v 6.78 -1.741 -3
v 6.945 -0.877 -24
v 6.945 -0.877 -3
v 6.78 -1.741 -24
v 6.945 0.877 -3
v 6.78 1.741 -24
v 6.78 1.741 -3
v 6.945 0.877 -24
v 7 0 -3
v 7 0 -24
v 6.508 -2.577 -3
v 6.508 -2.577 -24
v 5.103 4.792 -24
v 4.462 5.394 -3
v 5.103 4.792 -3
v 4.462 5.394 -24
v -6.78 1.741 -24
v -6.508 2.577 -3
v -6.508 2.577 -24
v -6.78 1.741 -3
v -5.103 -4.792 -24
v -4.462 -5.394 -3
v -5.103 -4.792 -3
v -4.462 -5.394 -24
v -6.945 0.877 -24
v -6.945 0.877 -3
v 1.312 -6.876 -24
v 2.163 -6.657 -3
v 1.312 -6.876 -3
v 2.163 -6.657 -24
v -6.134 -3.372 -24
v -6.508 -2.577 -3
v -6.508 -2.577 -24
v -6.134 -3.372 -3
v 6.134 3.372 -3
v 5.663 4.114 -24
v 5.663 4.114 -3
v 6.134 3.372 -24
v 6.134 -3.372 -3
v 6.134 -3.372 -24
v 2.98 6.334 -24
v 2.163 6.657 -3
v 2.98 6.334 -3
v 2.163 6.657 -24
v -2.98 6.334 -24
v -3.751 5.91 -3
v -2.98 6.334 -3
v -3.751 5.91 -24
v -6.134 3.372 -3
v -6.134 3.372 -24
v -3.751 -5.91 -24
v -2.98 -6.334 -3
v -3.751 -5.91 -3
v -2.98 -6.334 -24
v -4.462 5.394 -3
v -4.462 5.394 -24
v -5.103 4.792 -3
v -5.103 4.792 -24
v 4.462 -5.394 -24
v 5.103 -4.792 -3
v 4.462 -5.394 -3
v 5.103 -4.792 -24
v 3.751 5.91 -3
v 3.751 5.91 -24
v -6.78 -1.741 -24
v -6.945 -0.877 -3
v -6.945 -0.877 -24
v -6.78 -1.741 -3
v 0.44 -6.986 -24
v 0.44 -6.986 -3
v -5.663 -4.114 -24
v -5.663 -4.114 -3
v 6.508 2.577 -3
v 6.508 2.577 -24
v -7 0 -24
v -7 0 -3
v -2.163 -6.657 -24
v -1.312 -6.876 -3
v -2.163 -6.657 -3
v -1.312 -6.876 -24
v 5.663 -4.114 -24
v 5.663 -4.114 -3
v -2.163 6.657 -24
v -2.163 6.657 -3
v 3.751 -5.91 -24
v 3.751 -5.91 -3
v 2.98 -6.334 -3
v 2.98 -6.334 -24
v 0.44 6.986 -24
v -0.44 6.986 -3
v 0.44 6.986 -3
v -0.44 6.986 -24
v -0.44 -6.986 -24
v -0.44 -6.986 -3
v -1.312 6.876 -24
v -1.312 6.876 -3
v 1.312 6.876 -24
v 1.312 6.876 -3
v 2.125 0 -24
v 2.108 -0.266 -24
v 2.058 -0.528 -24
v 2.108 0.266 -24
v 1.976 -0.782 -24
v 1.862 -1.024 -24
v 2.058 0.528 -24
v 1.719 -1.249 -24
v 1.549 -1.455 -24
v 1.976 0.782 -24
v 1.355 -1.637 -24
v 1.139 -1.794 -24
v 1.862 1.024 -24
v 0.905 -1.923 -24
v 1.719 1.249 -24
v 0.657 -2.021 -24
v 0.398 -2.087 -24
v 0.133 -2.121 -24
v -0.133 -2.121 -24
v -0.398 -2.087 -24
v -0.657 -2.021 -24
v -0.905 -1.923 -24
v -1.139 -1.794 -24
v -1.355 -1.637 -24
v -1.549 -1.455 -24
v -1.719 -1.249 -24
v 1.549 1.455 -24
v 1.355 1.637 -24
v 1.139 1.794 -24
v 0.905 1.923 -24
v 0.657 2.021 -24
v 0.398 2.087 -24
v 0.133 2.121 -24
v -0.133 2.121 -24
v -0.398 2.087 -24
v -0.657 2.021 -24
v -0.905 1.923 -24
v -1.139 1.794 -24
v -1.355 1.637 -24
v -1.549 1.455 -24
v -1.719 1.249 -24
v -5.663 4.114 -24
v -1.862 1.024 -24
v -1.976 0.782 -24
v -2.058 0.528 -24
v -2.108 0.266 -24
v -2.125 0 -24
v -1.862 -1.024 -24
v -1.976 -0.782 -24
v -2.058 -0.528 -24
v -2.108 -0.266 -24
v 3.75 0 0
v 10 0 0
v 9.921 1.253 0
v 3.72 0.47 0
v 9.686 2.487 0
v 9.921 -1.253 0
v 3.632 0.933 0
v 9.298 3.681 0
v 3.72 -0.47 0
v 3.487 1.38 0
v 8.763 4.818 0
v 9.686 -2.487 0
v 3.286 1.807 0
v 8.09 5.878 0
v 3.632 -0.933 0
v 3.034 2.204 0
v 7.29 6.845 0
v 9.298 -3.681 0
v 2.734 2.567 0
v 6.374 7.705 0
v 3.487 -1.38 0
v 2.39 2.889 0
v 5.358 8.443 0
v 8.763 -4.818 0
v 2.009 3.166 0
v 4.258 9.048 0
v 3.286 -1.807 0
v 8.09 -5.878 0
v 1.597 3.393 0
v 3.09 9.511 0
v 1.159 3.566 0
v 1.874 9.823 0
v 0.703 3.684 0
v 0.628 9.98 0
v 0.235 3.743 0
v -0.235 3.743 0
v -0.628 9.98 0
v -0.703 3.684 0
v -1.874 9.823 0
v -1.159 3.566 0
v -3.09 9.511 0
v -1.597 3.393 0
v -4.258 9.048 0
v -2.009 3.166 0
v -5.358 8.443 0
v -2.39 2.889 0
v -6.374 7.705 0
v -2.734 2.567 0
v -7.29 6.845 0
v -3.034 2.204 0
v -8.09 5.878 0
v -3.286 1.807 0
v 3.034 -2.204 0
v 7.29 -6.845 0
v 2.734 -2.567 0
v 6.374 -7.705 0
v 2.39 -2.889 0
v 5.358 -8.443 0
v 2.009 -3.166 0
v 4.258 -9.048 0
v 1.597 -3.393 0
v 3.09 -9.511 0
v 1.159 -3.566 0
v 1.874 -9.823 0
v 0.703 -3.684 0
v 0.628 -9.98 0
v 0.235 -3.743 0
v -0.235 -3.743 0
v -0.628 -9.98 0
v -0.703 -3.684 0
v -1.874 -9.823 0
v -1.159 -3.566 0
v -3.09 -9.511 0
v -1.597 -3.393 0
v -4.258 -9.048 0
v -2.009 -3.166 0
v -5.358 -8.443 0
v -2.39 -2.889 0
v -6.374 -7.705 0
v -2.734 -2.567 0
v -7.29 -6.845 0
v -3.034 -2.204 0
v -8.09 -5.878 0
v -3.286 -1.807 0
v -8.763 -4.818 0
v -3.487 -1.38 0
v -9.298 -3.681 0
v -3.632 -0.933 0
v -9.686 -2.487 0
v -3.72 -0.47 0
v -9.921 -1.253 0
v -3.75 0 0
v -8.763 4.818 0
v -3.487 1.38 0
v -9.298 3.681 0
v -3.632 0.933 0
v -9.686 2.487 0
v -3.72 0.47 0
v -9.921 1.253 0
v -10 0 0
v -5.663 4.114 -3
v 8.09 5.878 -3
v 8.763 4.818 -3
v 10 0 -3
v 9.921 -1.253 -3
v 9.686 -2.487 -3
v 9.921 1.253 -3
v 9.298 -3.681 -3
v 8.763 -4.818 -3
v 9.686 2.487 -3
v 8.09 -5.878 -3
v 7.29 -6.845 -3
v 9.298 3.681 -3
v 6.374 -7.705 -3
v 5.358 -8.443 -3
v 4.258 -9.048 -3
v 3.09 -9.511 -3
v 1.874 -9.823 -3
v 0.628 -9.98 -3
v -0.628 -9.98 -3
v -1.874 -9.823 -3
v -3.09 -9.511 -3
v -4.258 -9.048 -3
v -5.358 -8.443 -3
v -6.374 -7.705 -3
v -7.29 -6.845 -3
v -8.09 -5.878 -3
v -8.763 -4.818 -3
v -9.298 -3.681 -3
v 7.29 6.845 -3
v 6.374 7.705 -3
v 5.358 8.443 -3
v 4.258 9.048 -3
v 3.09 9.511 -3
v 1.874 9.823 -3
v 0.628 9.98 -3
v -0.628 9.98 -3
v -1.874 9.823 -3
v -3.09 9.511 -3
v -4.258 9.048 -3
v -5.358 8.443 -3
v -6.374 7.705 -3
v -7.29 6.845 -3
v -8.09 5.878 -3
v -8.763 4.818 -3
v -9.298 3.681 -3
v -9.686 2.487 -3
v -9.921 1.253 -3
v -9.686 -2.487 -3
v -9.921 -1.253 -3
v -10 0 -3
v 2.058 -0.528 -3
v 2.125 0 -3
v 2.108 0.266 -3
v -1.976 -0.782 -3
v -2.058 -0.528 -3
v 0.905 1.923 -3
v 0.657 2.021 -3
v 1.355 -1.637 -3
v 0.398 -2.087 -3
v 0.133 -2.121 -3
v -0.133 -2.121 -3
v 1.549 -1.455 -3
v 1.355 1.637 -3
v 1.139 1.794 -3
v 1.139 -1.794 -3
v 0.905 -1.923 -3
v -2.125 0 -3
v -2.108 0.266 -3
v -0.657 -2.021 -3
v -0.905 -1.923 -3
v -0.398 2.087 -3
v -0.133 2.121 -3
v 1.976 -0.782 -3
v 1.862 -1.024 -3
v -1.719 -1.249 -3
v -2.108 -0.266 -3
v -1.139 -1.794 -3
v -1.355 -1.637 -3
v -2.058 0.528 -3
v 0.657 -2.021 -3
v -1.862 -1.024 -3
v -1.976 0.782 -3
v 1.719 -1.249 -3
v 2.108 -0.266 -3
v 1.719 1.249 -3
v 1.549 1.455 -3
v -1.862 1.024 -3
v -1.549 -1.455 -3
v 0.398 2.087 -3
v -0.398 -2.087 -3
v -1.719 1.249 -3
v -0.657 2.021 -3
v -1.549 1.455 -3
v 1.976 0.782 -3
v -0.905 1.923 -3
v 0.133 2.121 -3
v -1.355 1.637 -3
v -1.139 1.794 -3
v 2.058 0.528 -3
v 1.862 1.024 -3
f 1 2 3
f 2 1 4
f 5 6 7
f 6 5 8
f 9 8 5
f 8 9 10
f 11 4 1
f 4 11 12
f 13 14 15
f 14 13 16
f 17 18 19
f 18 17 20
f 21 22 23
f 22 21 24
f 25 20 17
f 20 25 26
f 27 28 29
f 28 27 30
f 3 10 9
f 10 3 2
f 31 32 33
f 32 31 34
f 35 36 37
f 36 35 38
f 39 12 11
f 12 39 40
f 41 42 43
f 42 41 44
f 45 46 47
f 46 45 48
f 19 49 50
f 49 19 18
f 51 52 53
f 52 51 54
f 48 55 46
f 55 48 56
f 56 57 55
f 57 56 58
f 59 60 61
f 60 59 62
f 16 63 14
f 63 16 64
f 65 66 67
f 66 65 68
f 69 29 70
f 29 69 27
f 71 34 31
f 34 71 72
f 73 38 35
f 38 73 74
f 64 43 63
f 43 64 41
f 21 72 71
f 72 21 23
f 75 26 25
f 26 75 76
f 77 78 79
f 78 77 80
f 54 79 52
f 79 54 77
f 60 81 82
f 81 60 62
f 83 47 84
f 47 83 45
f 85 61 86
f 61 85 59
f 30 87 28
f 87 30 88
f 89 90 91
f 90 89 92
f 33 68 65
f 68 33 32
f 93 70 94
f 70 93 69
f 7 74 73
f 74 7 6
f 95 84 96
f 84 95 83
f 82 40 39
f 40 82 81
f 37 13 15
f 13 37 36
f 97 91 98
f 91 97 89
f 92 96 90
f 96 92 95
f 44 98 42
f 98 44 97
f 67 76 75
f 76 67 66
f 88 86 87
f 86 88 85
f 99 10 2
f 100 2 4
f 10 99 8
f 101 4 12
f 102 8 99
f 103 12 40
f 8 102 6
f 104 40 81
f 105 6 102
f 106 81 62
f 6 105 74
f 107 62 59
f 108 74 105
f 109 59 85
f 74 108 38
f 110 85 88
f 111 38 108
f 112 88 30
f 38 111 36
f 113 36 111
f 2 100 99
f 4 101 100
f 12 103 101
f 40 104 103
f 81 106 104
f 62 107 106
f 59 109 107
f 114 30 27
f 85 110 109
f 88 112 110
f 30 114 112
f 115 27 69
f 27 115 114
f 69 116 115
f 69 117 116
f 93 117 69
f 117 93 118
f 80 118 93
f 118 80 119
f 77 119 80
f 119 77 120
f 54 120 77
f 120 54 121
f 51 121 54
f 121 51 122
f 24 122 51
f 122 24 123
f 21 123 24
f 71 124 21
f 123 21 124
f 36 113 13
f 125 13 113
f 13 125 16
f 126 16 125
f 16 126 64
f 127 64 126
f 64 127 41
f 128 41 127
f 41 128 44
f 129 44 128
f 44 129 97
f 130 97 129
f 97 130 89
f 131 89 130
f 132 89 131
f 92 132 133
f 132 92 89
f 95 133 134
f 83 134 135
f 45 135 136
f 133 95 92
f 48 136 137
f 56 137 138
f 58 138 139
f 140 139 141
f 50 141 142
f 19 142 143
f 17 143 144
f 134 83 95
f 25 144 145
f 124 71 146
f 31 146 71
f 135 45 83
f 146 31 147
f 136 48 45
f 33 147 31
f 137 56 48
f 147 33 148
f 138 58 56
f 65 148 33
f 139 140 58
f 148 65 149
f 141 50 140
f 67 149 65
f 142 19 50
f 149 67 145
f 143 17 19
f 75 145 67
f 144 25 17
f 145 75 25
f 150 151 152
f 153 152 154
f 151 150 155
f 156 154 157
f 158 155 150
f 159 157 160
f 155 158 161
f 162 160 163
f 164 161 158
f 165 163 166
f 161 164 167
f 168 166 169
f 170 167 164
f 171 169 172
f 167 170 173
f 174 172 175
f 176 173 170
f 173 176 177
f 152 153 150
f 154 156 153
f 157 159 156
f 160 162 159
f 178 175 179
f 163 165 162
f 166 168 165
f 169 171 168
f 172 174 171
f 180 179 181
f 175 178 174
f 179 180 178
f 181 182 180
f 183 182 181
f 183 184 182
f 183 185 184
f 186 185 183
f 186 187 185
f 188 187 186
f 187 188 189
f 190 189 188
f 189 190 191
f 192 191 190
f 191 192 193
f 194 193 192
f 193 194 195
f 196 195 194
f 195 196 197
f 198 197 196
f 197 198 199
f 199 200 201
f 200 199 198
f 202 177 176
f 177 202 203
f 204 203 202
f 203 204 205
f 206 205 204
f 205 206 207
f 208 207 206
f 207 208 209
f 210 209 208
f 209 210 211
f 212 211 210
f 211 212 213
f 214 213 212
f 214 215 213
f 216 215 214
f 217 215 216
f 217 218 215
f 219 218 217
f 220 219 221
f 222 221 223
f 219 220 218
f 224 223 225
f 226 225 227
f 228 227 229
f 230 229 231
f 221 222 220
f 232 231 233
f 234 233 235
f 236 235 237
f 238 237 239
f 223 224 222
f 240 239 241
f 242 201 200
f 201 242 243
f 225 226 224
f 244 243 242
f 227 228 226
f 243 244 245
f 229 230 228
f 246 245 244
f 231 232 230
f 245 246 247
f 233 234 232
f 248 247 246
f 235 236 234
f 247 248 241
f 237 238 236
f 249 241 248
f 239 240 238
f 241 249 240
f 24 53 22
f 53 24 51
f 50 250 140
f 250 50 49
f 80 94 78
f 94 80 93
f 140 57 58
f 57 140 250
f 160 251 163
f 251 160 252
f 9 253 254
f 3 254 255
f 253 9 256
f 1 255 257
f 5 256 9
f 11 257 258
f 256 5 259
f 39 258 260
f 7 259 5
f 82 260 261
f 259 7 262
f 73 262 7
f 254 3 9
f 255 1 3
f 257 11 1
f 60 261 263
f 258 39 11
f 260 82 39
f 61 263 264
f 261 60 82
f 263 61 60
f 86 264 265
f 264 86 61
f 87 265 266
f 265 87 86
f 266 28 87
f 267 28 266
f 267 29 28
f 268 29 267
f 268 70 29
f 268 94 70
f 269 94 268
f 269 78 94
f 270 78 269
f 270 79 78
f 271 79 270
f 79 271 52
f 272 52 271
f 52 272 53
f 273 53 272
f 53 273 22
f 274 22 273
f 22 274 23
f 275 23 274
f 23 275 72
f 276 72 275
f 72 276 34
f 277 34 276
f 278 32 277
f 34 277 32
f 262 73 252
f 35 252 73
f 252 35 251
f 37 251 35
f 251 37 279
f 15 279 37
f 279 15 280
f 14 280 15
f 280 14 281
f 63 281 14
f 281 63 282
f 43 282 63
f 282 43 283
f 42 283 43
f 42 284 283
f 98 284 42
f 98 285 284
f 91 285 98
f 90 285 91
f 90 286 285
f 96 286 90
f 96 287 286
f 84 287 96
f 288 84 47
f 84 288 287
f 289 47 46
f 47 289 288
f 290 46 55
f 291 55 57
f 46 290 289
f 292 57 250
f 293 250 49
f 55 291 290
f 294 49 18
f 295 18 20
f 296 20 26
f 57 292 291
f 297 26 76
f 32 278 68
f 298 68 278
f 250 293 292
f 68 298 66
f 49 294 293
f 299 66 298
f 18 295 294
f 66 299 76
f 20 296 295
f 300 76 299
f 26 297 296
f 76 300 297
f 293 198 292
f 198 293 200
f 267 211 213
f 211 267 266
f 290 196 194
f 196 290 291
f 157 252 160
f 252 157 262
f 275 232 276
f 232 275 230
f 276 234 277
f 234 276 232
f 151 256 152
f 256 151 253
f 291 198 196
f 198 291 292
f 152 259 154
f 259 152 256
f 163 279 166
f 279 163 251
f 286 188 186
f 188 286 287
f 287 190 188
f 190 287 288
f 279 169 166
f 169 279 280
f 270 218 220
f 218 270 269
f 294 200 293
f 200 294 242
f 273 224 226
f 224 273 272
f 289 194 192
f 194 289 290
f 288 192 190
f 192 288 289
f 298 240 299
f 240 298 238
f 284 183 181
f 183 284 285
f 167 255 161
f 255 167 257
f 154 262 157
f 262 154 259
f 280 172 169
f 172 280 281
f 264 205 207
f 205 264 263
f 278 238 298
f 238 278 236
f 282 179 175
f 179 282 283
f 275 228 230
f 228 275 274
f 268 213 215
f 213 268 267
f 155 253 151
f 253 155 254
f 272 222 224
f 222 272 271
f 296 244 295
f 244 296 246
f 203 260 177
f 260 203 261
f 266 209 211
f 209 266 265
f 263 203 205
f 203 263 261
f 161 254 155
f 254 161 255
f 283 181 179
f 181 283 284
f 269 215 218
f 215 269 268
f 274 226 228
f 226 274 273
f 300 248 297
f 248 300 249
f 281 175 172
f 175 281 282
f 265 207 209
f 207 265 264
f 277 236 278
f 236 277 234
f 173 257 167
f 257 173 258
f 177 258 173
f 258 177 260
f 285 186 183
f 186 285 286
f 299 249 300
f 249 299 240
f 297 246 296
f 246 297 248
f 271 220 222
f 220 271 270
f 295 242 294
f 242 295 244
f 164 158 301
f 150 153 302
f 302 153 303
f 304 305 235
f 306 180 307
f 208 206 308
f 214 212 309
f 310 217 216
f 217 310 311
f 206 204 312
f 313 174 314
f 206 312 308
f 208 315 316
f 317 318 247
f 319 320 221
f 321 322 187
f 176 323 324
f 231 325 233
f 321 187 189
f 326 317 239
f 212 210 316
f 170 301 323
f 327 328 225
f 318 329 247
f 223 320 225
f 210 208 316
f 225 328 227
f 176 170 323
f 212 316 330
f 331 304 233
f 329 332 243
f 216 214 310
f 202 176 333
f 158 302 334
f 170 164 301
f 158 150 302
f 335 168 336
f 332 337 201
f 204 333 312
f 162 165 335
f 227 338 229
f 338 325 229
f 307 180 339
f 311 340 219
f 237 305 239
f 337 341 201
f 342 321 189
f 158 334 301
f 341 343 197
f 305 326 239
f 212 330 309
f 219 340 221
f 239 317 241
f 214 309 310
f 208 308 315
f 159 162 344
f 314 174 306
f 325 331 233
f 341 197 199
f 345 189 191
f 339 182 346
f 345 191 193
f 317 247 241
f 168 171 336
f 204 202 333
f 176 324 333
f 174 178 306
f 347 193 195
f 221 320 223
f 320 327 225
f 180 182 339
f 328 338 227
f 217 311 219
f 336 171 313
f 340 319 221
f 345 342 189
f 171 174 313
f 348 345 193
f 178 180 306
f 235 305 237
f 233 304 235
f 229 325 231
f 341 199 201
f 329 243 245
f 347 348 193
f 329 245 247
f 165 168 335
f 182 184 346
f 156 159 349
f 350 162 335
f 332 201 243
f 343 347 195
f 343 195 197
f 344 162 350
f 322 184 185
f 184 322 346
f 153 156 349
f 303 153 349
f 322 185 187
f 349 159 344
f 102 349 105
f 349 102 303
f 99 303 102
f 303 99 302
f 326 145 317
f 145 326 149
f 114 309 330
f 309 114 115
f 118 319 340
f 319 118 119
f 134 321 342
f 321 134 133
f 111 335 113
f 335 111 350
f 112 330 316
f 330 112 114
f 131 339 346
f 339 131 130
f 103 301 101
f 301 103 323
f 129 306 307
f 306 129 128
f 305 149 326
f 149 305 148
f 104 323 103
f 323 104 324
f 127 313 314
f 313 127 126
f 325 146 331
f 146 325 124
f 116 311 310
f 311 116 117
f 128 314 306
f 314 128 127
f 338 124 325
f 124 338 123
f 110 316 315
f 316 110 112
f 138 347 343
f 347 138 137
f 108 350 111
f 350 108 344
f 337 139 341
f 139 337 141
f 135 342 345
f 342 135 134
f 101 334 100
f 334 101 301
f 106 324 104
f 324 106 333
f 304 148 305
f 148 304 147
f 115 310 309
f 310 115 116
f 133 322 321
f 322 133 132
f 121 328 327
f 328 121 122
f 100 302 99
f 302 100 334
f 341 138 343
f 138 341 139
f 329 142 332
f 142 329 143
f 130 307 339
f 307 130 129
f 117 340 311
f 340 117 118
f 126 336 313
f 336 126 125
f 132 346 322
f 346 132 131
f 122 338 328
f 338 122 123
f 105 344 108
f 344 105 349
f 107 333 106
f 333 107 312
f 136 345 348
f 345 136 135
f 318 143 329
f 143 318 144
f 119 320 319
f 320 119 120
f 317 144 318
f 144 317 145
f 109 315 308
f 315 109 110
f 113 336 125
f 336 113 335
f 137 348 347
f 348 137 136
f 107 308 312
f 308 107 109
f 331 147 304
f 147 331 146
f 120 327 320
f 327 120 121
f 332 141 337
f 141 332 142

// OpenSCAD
$fn = 50;


difference() {
	union() {
		translate(v = [0, 0, -24.0000000000]) {
			cylinder(h = 24, r = 7.0000000000);
		}
		translate(v = [0, 0, -3.0000000000]) {
			cylinder(h = 3, r = 10.0000000000);
		}
	}
	union() {
		translate(v = [0, 0, 0]) {
			rotate(a = [0, 0, 0]) {
				difference() {
					union() {
						#translate(v = [0, 0, -24.0000000000]) {
							cylinder(h = 24, r = 2.0000000000);
						}
						#translate(v = [0, 0, -3]) {
							cylinder(h = 3, r = 7.0000000000, r1 = 2.1250000000, r2 = 3.7500000000);
						}
						#translate(v = [0, 0, -24.0000000000]) {
							cylinder(h = 24, r = 2.1250000000);
						}
						#translate(v = [0, 0, -24.0000000000]) {
							cylinder(h = 24, r = 2.0000000000);
						}
					}
					union();
				}
			}
		}
	}
}
